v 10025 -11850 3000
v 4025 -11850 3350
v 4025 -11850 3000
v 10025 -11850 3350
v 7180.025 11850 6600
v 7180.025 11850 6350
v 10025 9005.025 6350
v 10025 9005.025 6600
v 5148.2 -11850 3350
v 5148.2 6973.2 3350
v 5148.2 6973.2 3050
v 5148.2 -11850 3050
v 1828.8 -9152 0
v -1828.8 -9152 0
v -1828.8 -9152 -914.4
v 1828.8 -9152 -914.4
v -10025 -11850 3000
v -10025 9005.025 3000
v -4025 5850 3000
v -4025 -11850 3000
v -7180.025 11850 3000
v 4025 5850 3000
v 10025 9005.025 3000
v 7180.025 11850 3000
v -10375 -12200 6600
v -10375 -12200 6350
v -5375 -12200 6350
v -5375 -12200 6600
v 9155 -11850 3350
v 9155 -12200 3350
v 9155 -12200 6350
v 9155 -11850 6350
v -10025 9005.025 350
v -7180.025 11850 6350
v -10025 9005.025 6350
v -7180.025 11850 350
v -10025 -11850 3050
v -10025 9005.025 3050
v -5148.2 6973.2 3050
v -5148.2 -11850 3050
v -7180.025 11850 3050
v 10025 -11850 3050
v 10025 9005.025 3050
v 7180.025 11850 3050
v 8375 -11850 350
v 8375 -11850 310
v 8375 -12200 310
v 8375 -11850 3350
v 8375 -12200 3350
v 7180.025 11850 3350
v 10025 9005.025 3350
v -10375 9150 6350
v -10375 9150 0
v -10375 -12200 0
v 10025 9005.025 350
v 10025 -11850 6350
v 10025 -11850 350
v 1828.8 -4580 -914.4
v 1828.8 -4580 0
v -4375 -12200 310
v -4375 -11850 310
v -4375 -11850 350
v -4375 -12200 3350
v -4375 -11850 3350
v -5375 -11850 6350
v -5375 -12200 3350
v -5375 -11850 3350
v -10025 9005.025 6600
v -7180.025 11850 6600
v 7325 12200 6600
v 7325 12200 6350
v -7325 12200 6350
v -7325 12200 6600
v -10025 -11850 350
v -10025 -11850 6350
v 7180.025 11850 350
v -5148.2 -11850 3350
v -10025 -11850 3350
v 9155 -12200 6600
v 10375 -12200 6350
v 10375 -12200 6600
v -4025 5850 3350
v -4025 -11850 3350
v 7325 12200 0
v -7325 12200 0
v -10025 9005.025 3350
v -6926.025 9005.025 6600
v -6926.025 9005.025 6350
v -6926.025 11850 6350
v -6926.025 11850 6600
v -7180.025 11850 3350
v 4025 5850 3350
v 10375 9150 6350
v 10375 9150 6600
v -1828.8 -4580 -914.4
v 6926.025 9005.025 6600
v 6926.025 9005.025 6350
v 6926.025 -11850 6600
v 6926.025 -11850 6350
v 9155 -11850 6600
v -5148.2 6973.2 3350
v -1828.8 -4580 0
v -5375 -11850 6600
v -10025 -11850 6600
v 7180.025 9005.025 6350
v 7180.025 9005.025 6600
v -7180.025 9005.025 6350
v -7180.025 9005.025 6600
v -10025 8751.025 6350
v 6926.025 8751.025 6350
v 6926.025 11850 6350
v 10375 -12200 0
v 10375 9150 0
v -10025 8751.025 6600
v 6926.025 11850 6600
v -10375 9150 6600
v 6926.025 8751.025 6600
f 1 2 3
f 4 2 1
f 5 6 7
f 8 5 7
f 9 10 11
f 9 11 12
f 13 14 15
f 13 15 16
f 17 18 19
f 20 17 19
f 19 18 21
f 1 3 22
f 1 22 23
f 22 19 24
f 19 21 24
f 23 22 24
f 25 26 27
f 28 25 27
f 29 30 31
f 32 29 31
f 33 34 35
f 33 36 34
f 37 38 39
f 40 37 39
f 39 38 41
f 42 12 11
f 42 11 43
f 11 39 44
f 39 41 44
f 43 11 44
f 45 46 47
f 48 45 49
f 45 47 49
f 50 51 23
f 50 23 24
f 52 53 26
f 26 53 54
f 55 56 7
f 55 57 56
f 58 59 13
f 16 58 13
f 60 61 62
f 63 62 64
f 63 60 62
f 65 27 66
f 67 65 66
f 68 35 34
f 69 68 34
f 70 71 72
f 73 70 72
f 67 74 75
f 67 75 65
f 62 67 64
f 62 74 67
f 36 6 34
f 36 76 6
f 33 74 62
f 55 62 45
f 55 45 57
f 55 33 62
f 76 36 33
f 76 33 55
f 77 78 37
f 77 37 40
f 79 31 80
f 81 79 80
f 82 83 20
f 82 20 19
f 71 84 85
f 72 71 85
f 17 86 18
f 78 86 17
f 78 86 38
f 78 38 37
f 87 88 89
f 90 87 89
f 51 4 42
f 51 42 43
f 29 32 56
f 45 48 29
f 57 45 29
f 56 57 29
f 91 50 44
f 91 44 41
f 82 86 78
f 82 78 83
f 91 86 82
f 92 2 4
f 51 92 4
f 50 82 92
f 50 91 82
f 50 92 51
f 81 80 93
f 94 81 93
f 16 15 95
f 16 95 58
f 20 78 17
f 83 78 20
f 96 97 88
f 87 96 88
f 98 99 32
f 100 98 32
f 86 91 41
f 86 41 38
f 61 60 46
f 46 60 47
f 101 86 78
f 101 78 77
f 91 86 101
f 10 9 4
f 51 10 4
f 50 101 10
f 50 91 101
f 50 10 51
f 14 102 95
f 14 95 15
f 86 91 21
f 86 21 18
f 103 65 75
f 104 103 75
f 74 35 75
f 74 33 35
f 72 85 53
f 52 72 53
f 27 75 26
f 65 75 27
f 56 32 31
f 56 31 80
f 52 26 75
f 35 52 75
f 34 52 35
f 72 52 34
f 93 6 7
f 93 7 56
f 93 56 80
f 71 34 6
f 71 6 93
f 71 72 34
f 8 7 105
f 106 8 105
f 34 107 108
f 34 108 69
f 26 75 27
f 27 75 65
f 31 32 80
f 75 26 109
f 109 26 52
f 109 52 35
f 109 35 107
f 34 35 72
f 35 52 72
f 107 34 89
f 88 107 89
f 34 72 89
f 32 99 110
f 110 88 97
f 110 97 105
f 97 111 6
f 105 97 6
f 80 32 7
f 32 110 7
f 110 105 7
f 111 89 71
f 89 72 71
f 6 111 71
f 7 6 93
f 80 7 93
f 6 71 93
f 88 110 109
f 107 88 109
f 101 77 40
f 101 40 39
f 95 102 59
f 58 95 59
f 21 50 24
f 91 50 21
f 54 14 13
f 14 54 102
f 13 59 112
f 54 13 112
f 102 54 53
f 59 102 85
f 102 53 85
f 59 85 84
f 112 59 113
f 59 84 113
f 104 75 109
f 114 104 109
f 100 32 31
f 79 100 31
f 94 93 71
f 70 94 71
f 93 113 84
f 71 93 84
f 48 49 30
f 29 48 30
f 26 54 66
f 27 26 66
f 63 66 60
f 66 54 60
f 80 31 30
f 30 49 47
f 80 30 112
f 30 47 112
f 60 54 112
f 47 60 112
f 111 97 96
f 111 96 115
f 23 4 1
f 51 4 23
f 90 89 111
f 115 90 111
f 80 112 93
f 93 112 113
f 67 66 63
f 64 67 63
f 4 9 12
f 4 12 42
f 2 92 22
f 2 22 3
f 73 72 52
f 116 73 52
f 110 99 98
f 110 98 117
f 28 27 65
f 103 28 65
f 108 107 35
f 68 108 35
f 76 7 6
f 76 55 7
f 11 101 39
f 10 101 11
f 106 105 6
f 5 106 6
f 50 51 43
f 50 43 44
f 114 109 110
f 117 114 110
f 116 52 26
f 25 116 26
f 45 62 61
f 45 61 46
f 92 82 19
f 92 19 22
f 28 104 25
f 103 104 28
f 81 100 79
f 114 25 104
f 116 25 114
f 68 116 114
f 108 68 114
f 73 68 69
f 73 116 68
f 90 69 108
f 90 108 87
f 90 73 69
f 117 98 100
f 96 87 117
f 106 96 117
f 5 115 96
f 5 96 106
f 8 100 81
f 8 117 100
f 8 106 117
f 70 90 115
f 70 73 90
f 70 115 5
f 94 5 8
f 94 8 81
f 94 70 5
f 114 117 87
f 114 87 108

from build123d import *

# Parameters (mm, degrees)
F1_DEPTH  = 6350
F2_T      = -350
F3_W      = 12750
F3_H      = 3040
F4_DEPTH  = 350
F5_W      = 13852.0505063388
F5_H      = 254
F5_W_2    = 254
F5_H_2    = 20601.0252531694
F5_W_3    = 2844.9747468306
F5_H_3    = 2844.9747468306
F6_DEPTH  = 250
F7_W      = 3657.6
F7_H      = 4572
F8_DEPTH  = 914.4
F10_DEPTH = 300
F12_DEPTH = 350


# Not quite as in the source:
# - a feature names something its author has since deleted; it is built from what else it names


with BuildPart() as f1:
    # F0 (on Top) → F1 (new body)
    with BuildSketch(Plane.XY):
        Polygon((7325, 12200), (-7325, 12200), (-10375, 9150), (-10375, -12200), (10375, -12200), (10375, 9150), align=None)
    extrude(amount=F1_DEPTH)

    # F2
    f2_openings = [f1.faces().sort_by_distance(p)[0] for p in [
        (0, -209.322901, 6350),
    ]]
    offset(amount=F2_T, openings=f2_openings)

    # F3 (on face) → F4 (cut, through all)
    with BuildSketch(Plane.XZ.offset(12200)):
        with Locations((2000, 1830)):
            Rectangle(F3_W, F3_H)
        Polygon((9155, 6350), (-5375, 6350), (-5375, 3350), (-4375, 3350), (8375, 3350), (9155, 3350), align=None)
    extrude(amount=-F4_DEPTH, mode=Mode.SUBTRACT)

    # F7 (on face) → F8 (join)
    with BuildSketch(Plane(origin=(0, 0, 0), x_dir=(1, 0, 0), z_dir=(0, 0, -1))):
        with Locations((0, 6866)):
            Rectangle(F7_W, F7_H)
    extrude(amount=F8_DEPTH)


with BuildPart() as f6:
    # F5 (on face) → F6 (new body)
    with BuildSketch(Plane.XY.offset(6350)):
        Polygon((-7325, 12200), (-10375, 9150), (-10375, -12200), (-5375, -12200), (-5375, -11850), (-6926.0252531694, -11850), (-10025, -11850), (-10025, 8751.0252531694), (-10025, 9005.0252531694), (-7180.0252531694, 11850), (-6926.0252531694, 11850), (6926.0252531694, 11850), (7180.0252531694, 11850), (10025, 9005.0252531694), (10025, 8751.0252531694), (10025, -11850), (10375, -11850), (10375, 9150), (7325, 12200), align=None)
        Polygon((10375, -12200), (10375, -11850), (10025, -11850), (9155, -11850), (9155, -12200), align=None)
        with Locations((0, 8878.0252531694)):
            Rectangle(F5_W, F5_H)
        with Locations((-7053.0252531694, 8878.0252531694)):
            Rectangle(F5_W_2, F5_H)
        with Locations((7053.0252531694, -1549.4873734153)):
            Rectangle(F5_W_2, F5_H_2)
        Polygon((9155, -11850), (10025, -11850), (10025, 8751.0252531694), (7180.0252531694, 8751.0252531694), (7180.0252531694, -11850), align=None)
        with Locations((-8602.5126265847, 8878.0252531694)):
            Rectangle(F5_W_3, F5_H)
        with Locations((7053.0252531694, 8878.0252531694)):
            Rectangle(F5_W_2, F5_H)
        with Locations((-7053.0252531694, 10427.5126265847)):
            Rectangle(F5_W_2, F5_H_3)
        with Locations((8602.5126265847, 8878.0252531694)):
            Rectangle(F5_W_3, F5_H)
        with Locations((7053.0252531694, 10427.5126265847)):
            Rectangle(F5_W_2, F5_H_3)
    extrude(amount=F6_DEPTH)


with BuildPart() as f10:
    # F9 (on face) → F10 (new body)
    with BuildSketch(Plane.XY.offset(3350)):
        Polygon((-10025, 9005.0252531694), (-10025, -11850), (-5375, -11850), (-5148.2, -11850), (-5148.2, 6973.2), (5148.2, 6973.2), (5148.2, -11850), (10025, -11850), (10025, 9005.0252531694), (7180.0252531694, 11850), (-7180.0252531694, 11850), align=None)
    extrude(amount=-F10_DEPTH)


with BuildPart() as f12:
    # F11 (on face) → F12 (new body)
    with BuildSketch(Plane.XY.offset(3350)):
        Polygon((-10025, 9005.0252531694), (-10025, -11850), (-4025, -11850), (-4025, 5850), (4025, 5850), (4025, -11850), (10025, -11850), (10025, 9005.0252531694), (7180.0252531694, 11850), (-7180.0252531694, 11850), align=None)
    extrude(amount=-F12_DEPTH)


solid = Compound([f1.part, f6.part, f10.part, f12.part])
